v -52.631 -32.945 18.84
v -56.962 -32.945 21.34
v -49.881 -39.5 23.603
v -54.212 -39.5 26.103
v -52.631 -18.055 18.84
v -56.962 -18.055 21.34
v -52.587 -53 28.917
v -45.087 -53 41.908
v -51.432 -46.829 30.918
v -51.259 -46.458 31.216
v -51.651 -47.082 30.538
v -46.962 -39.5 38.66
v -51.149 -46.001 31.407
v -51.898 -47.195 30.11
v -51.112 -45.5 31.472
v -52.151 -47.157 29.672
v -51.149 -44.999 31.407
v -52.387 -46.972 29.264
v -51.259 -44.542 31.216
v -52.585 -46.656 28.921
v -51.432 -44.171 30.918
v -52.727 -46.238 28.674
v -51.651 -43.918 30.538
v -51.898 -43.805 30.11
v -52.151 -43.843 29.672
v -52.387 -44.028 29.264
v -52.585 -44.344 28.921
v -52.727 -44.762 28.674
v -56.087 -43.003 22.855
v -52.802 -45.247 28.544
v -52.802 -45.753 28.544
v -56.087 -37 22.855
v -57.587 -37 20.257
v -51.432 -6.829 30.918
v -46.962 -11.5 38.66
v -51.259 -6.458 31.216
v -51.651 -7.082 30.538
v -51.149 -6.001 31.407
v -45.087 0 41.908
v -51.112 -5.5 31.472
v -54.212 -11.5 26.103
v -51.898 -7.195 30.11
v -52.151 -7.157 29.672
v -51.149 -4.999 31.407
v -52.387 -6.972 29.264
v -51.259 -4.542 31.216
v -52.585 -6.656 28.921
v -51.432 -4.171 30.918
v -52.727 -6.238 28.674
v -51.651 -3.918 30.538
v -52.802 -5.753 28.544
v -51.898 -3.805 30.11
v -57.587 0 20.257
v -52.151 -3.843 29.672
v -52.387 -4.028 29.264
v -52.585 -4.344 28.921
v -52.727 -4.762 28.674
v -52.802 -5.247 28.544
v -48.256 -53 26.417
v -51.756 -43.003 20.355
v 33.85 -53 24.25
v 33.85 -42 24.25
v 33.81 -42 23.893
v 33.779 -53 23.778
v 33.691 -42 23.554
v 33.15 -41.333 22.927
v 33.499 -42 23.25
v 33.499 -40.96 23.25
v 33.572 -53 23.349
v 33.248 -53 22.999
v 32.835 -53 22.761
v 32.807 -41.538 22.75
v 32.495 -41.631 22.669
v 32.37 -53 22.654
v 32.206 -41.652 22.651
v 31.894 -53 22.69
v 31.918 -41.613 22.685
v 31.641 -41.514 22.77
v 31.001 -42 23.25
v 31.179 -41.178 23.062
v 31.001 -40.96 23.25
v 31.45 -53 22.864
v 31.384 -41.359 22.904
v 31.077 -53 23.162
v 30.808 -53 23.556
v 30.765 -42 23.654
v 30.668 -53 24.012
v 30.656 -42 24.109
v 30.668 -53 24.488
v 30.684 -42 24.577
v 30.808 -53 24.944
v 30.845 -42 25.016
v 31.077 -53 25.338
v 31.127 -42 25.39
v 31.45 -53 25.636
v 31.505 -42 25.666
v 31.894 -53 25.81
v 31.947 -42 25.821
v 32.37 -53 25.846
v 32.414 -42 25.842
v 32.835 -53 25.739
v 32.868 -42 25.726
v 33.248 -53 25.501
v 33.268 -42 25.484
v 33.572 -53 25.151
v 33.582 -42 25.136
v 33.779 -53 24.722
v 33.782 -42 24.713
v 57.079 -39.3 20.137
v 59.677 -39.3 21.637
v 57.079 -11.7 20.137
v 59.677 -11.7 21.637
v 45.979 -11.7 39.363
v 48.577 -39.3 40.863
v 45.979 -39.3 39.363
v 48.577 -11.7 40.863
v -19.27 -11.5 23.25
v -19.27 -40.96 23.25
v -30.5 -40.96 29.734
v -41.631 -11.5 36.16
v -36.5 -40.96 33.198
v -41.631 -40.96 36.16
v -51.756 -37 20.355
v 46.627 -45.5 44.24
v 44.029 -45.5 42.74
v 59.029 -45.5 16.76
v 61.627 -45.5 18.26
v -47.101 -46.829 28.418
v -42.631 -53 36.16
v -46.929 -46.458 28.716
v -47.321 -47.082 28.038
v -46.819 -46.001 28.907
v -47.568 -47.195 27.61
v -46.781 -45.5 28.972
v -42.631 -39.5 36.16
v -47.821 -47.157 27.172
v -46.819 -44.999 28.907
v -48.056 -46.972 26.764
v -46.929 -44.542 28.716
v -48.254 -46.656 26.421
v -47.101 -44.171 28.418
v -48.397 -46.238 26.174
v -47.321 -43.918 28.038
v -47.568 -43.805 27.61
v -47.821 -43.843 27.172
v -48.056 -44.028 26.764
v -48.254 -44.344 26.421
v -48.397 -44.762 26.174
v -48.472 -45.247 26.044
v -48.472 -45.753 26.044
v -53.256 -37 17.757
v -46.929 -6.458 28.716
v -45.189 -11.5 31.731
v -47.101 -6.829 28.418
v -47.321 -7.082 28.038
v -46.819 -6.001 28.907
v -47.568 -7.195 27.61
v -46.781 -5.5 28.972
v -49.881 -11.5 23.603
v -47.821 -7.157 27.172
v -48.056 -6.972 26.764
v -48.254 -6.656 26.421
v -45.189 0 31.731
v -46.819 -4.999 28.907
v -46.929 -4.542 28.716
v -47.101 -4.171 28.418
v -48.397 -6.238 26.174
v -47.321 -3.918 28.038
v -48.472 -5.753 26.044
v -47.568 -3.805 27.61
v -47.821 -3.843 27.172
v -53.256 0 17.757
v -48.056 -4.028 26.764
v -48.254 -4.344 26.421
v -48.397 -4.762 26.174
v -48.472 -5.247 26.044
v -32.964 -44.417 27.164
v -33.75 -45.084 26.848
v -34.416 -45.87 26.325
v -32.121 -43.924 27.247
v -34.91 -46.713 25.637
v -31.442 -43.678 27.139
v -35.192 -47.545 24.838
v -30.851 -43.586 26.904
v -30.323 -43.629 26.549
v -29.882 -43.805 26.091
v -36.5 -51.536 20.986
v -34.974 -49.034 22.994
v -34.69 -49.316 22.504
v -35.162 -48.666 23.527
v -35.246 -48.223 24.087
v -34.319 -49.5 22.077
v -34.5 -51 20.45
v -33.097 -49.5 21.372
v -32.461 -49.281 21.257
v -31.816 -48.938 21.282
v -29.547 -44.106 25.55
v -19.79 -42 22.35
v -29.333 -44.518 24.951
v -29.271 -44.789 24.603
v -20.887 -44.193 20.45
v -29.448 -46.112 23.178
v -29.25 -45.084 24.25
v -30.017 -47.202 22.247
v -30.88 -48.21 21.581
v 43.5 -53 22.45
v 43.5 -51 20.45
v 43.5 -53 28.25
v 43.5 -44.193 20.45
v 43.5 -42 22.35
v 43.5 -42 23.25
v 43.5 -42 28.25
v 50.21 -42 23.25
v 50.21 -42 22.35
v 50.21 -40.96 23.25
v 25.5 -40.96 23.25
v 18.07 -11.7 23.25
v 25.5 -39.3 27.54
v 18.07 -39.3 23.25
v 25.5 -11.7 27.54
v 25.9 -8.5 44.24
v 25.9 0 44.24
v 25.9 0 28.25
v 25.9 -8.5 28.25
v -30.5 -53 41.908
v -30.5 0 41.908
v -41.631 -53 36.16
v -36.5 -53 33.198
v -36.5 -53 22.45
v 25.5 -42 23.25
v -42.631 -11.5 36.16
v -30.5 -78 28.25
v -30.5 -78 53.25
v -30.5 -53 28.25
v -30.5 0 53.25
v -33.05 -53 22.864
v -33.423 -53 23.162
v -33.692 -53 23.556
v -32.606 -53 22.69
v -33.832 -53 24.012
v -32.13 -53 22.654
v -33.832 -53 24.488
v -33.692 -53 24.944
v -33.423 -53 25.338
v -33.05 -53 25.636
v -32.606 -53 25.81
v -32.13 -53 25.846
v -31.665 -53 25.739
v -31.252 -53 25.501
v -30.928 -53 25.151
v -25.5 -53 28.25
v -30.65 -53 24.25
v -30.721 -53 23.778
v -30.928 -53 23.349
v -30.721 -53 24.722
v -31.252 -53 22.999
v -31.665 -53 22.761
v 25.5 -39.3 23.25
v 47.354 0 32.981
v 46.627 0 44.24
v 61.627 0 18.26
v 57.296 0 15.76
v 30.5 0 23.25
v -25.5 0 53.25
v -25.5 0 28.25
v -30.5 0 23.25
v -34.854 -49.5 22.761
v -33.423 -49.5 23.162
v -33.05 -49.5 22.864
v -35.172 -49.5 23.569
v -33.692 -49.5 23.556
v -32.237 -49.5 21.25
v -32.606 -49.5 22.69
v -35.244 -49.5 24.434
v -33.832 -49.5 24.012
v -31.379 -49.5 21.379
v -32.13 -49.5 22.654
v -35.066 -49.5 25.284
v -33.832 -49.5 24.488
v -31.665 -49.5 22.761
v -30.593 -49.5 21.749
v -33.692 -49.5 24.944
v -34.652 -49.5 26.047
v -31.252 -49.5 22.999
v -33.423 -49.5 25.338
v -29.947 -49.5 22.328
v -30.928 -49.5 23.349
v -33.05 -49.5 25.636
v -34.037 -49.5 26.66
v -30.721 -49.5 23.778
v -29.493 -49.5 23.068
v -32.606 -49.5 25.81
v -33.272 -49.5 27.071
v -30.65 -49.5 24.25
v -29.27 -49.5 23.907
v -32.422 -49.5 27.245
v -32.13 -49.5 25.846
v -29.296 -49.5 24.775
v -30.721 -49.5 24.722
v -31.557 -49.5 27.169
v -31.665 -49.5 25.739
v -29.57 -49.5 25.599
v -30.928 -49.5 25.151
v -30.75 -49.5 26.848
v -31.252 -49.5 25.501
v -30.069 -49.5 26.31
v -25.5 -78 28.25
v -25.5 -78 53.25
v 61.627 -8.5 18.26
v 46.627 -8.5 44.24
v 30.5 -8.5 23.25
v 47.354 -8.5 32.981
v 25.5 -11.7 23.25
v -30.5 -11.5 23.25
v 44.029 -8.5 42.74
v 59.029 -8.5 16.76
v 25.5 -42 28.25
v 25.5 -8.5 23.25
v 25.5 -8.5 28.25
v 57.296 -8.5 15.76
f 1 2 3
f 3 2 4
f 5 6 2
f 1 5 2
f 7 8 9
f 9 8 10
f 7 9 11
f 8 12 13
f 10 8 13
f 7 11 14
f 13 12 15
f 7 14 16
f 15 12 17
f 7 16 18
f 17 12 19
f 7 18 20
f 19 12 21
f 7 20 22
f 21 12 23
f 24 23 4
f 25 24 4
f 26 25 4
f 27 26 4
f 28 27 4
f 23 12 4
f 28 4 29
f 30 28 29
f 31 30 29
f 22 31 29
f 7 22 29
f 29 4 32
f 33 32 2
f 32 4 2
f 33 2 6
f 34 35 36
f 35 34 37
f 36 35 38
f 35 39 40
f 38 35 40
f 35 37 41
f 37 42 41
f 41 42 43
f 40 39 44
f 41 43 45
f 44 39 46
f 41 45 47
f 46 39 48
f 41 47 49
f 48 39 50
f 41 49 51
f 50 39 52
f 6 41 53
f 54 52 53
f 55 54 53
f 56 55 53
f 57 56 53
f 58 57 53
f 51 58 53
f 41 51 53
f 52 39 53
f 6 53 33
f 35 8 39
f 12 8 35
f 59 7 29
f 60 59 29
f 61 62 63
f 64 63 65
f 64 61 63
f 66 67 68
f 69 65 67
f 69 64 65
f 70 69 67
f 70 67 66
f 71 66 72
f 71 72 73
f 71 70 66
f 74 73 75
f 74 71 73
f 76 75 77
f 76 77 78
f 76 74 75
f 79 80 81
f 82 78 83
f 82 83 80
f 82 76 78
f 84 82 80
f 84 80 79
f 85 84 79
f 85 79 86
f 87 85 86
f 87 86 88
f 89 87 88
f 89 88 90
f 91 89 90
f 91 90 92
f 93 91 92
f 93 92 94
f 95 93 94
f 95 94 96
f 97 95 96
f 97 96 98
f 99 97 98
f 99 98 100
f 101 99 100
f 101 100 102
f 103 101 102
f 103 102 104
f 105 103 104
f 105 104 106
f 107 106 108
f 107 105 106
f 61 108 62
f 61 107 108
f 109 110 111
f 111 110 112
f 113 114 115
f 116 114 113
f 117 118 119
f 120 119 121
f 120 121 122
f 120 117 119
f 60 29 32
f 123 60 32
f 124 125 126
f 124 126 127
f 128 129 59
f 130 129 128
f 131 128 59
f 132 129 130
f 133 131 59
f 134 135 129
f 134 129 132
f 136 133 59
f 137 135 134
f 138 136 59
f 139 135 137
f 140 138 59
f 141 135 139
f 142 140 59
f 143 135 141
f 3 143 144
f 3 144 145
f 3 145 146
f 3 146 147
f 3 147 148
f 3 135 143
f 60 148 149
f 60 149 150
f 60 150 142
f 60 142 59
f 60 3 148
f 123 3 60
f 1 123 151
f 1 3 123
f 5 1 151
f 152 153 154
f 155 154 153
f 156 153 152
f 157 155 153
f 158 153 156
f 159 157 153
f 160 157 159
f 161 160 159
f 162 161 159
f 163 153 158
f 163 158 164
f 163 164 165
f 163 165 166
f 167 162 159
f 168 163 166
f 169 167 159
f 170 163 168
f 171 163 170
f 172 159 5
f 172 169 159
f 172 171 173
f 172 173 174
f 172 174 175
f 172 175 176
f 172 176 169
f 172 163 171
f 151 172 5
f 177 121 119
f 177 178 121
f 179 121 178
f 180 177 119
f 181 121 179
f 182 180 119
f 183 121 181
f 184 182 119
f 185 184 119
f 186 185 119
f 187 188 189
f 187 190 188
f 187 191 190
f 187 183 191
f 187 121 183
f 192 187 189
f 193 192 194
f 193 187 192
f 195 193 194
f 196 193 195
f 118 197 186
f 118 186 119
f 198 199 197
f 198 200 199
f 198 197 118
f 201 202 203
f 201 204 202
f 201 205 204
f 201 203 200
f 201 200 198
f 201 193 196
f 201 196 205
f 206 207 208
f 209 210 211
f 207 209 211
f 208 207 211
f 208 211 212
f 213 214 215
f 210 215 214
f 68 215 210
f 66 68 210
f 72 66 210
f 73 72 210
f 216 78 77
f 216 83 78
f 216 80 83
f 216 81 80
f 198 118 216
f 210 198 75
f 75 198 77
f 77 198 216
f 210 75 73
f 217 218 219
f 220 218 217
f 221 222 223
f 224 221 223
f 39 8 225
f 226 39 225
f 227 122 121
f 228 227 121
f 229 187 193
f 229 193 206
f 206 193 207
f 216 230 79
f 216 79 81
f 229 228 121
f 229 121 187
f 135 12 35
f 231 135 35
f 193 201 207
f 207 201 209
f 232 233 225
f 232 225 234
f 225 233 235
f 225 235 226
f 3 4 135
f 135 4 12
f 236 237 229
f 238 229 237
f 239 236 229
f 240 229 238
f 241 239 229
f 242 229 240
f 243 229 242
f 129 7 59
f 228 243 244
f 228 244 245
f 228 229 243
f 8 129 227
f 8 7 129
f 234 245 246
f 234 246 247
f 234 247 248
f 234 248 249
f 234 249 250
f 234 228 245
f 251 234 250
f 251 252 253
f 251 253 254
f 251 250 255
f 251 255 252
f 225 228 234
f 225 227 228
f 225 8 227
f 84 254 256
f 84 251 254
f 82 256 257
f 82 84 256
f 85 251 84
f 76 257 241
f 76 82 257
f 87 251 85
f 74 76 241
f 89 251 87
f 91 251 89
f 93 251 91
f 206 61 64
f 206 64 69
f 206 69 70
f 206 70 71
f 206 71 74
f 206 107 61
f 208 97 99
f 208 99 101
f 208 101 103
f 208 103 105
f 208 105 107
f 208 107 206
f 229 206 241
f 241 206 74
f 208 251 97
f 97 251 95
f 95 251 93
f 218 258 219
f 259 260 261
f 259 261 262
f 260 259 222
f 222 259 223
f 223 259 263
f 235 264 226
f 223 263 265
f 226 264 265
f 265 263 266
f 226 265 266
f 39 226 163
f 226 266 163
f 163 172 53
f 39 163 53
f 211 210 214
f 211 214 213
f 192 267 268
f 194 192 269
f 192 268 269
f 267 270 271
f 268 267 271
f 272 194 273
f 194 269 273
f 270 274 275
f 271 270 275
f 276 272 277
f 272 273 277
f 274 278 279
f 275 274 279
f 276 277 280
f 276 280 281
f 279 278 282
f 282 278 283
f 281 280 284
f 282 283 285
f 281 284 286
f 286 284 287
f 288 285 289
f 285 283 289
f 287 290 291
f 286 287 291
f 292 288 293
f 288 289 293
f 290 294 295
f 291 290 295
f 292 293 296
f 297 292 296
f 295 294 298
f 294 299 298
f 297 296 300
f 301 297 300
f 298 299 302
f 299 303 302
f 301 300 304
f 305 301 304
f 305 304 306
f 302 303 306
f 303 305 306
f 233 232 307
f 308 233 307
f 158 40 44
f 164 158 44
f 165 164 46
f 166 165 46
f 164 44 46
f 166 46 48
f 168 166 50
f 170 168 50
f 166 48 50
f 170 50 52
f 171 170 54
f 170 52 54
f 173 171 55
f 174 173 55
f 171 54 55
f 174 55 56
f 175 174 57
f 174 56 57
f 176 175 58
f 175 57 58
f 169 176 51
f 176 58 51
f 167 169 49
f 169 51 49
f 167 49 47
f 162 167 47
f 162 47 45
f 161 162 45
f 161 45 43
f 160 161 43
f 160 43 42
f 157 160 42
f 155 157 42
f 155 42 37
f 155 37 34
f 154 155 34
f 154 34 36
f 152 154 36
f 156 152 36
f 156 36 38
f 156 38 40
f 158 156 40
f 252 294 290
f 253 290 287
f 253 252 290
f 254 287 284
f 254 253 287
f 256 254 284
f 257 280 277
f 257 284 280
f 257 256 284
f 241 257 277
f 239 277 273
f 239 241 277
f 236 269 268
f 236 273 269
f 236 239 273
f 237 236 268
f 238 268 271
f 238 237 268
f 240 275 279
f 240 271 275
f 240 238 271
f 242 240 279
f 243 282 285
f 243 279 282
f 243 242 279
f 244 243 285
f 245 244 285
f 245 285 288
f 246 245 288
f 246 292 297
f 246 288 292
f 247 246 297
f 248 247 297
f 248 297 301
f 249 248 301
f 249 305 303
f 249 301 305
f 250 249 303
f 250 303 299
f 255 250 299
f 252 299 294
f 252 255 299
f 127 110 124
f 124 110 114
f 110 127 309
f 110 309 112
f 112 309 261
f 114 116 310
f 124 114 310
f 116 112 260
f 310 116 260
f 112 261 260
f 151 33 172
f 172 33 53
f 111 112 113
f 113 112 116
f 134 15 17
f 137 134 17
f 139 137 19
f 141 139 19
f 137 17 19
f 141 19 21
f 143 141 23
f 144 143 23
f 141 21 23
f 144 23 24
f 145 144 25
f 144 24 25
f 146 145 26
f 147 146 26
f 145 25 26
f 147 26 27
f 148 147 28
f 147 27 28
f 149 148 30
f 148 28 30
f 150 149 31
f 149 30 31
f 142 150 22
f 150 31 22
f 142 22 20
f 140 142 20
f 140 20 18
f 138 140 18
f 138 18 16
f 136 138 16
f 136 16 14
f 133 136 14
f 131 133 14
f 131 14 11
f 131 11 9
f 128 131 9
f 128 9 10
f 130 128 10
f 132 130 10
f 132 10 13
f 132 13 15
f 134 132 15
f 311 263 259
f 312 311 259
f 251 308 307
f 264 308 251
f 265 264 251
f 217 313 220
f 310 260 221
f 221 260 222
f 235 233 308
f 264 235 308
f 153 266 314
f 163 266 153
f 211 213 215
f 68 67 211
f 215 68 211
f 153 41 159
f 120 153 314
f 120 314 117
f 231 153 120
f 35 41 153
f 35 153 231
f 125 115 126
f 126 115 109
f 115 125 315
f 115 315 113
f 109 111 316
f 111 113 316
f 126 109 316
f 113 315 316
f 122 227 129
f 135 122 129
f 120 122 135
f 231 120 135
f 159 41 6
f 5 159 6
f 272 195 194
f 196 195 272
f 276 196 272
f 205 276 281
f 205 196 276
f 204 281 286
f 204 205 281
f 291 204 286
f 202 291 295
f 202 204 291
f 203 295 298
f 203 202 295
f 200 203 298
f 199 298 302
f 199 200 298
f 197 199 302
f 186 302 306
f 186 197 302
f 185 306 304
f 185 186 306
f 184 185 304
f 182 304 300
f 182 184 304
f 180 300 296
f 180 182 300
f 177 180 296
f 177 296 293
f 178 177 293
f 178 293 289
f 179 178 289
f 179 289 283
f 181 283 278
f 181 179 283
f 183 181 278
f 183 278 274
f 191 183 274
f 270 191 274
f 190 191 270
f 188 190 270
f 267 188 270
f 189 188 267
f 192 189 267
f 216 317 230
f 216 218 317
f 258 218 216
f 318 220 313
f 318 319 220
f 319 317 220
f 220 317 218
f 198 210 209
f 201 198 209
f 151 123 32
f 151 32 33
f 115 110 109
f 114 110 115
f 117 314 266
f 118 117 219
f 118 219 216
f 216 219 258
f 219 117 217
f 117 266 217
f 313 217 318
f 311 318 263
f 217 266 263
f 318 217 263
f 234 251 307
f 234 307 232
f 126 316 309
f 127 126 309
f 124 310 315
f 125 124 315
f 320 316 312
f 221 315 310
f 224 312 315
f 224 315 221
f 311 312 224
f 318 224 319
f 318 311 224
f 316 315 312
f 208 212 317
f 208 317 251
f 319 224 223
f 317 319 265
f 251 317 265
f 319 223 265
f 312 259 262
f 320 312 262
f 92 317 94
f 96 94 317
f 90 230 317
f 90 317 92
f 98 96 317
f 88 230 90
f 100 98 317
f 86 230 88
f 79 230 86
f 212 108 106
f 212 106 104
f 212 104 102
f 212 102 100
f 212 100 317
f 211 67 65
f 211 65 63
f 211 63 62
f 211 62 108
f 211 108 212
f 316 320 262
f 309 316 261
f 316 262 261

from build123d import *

# Parameters (mm, degrees)
SKETCH1_W                    = 56
SKETCH1_H                    = 5
BOSS_EXTRUDE1_DEPTH          = 42
SKETCH2_W                    = 5
SKETCH2_H                    = 25
BOSS_EXTRUDE2_DEPTH          = 78
BOSS_EXTRUDE3_DEPTH          = 5
SKETCH5_W                    = 30
SKETCH5_H                    = 37
BOSS_EXTRUDE4_DEPTH          = 3
SKETCH9_W                    = 80
SKETCH9_H                    = 10
BOSS_EXTRUDE7_DEPTH          = 7.8
SKETCH6_R                    = 1.7
CUT_EXTRUDE1_DEPTH           = 10
SKETCH6_3_R                  = 1.7
CUT_EXTRUDE2_DEPTH           = 7.8
BOSS_EXTRUDE5_REACH          = 114.771
CUT_EXTRUDE3_START           = 3
CUT_EXTRUDE3_DEPTH           = 30
BOSS_EXTRUDE8_REACH          = 104.503
SKETCH12_W                   = 6
SKETCH12_H                   = 10
SKETCH14_W                   = 21.376587736
SKETCH14_H                   = 30
BOSS_EXTRUDE9_DEPTH          = 10
CUT_EXTRUDE4_DEPTH           = 113.771445038
SKETCH17_W                   = 20
SKETCH17_H                   = 15
CUT_EXTRUDE5_DEPTH           = 94.029704558
CUT_EXTRUDE6_DEPTH           = 126.411384609
BOSS_EXTRUDE11_DEPTH         = 70
CUT_EXTRUDE7_DEPTH           = 94.029704558
CUT_EXTRUDE8_DEPTH           = 97.630216889
BOSS_EXTRUDE12_DEPTH         = 1
M3_START                     = -53
M3_CLEARANCE_HOLE1_OUTLINE_R = 1.6
M3_CLEARANCE_HOLE1_DEPTH     = 12.039780493
BOSS_EXTRUDE13_REACH         = 111.463
SKETCH25_W                   = 15
SKETCH25_H                   = 40.960219507
BOSS_EXTRUDE14_DEPTH         = 12.039780493
SKETCH27_W                   = 18
SKETCH27_H                   = 11.5
BOSS_EXTRUDE15_DEPTH         = 5.614909
SKETCH28_R                   = 3
CUT_EXTRUDE9_DEPTH           = 38
CHAMFER4_SIZE                = 2
BOSS_EXTRUDE16_DEPTH         = 8.5
CUT_EXTRUDE10_DEPTH          = 108.068430529
BOSS_EXTRUDE17_DEPTH         = 37
CUT_EXTRUDE11_DEPTH          = 40
CUT_EXTRUDE11_DEPTH_BACK     = 137.170264842
SKETCH31_W                   = 22.2
SKETCH31_H                   = 27.6


# Read off the part's stored shape, not the designer's step: M3 Clearance Hole1
with BuildPart() as part:
    # Sketch1 → Boss-Extrude1 (new body)
    with BuildSketch(Plane(origin=(0, 0, 0), x_dir=(1, 0, 0), z_dir=(0, 1, 0))):
        with Locations((-2.5, -25.75)):
            Rectangle(SKETCH1_W, SKETCH1_H)
    extrude(amount=-BOSS_EXTRUDE1_DEPTH)

    # Sketch2 → Boss-Extrude2 (add)
    with BuildSketch(Plane(origin=(0, 0, 0), x_dir=(1, 0, 0), z_dir=(0, 1, 0))):
        with Locations((-28, -40.75)):
            Rectangle(SKETCH2_W, SKETCH2_H)
    extrude(amount=-BOSS_EXTRUDE2_DEPTH)

    # Sketch9 → Boss-Extrude7 (add)
    with BuildSketch(Plane(origin=(0, 0, 28.25), x_dir=(-1, 0, 0), z_dir=(0, 0, -1))):
        with Locations((-3.5, -47)):
            Rectangle(SKETCH9_W, SKETCH9_H)
    extrude(amount=BOSS_EXTRUDE7_DEPTH)


with BuildPart() as body_2:
    # Sketch4 → Boss-Extrude3 (new body)
    with BuildSketch(Plane(origin=(-51.961524227, 0, 30), x_dir=(-0.500000000000001, 0, -0.8660254037844382), z_dir=(0.866025403784438, 0, -0.5000000000000009))):
        Polygon((1.25, -53), (8.25, -43.002963953), (8.25, -37), (11.25, -37), (11.25, 0), (-13.75, 0), (-13.75, -53), align=None)
    extrude(amount=BOSS_EXTRUDE3_DEPTH)

    # Sketch6 → Cut-Extrude1 (cut)
    with BuildSketch(Plane(origin=(-51.961524227, 0, 30), x_dir=(0.5000000000000009, 0, 0.8660254037844383), z_dir=(-0.8660254037844382, 0, 0.5000000000000008))):
        Polygon((10, -11.5), (-4.5, -11.5), (-10, -18.054644759), (-10, -32.945355241), (-4.5, -39.5), (10, -39.5), align=None)
        with Locations((0, -5.5)):
            Circle(SKETCH6_R)
    extrude(amount=-CUT_EXTRUDE1_DEPTH, mode=Mode.SUBTRACT)

    # Sketch6<3> → Cut-Extrude2 (cut)
    with BuildSketch(Plane(origin=(-51.961524227, 0, 30), x_dir=(0.5000000000000009, 0, 0.8660254037844383), z_dir=(-0.8660254037844382, 0, 0.5000000000000008))):
        with Locations((0, -45.5)):
            Circle(SKETCH6_3_R)
    extrude(amount=-CUT_EXTRUDE2_DEPTH, mode=Mode.SUBTRACT)

    # Boss-Extrude5: up to this face of the body (flat: up to its plane)
    boss_extrude5_end = Plane(body_2.part.faces().sort_by_distance((-46.671460718, -53, 34.162658774))[0])
    # Sketch7 → Boss-Extrude5 (add, up to the picked face)
    with BuildSketch(Plane(origin=(0, 0, 0), x_dir=(1, 0, 0), z_dir=(0, 1, 0)), mode=Mode.PRIVATE) as boss_extrude5_sk1:
        Polygon((-45.086524227, -41.907849302), (-30.5, -41.907849302), (-30.5, -36.160254038), (-42.631397208, -36.160254038), (-40.756397208, -39.407849302), align=None)
    boss_extrude5_tool1 = split(extrude(boss_extrude5_sk1.sketch, amount=-BOSS_EXTRUDE5_REACH, mode=Mode.PRIVATE), bisect_by=boss_extrude5_end, keep=Keep.BOTH, mode=Mode.PRIVATE)

    add(part.part)  # Boss-Extrude5 merges part
    add(boss_extrude5_tool1.solids().sort_by(Axis((-36.415744, 0, 39.11699), (0, -1, 0)))[0])

    # Sketch11 → Cut-Extrude3 (cut)
    with BuildSketch(Plane(origin=(-47.631397208, 0, 27.5), x_dir=(-0.5000000000000007, 0, -0.8660254037844384), z_dir=(0.8660254037844383, 0, -0.5000000000000006)).offset(CUT_EXTRUDE3_START)):
        Polygon((4.5, -42), (4.5, -39.5), (10, -32.945355241), (10, -18.054644759), (4.5, -11.5), (-10.5, -11.5), (-10.5, -42), align=None)
    extrude(amount=CUT_EXTRUDE3_DEPTH, mode=Mode.SUBTRACT)

    # Sketch12 → Boss-Extrude8 (add, up to next)
    with BuildSketch(Plane.XY.offset(28.25), mode=Mode.PRIVATE) as boss_extrude8_sk1:
        with Locations((-33.5, -47)):
            Rectangle(SKETCH12_W, SKETCH12_H)
    boss_extrude8_tool1 = extrude(boss_extrude8_sk1.sketch, amount=BOSS_EXTRUDE8_REACH, mode=Mode.PRIVATE) - body_2.part
    add(boss_extrude8_tool1.solids().sort_by_distance((-33.5, -47, 28.25))[0])

    # Sketch14 → Boss-Extrude9 (add)
    with BuildSketch(Plane(origin=(12.865054877, -25.730109754, 22.282928689), x_dir=(0.8660254037844385, 0, -0.5000000000000004), z_dir=(0.3535533905932723, -0.7071067811865512, 0.6123724356957913))):
        with Locations((-39.001760389, -22.151235068)):
            Rectangle(SKETCH14_W, SKETCH14_H)
    extrude(amount=BOSS_EXTRUDE9_DEPTH)

    # Sketch15 → Cut-Extrude4 (cut, through all)
    with BuildSketch(Plane(origin=(0, 0, 0), x_dir=(1, 0, 0), z_dir=(0, 1, 0))):
        Polygon((-36.5, -36.160254038), (-36.5, -20.45), (-43.302739548, -24.377563509), align=None)
        Polygon((-36.5, -20.45), (-20.88676203, -20.45), (-24.790071522, -13.689269641), align=None)
        Polygon((-16.38342993, -28.25), (-25.5, -28.25), (-25.5, -46.759010276), (-10.647935899, -38.184167069), align=None)
        Polygon((-30.5, -41.907849302), (-33.181624327, -41.907849302), (-30.5, -46.552558883), align=None)
    extrude(amount=-CUT_EXTRUDE4_DEPTH, mode=Mode.SUBTRACT)

    # Sketch17 → Cut-Extrude5 (cut, through all)
    with BuildSketch(Plane(origin=(12.865054877, -25.730109754, 22.282928689), x_dir=(0.8660254037844385, 0, -0.5000000000000004), z_dir=(0.3535533905932723, -0.7071067811865512, 0.6123724356957913))):
        with Locations((-38.313466521, -30.509099445)):
            Rectangle(SKETCH17_W, SKETCH17_H)
    extrude(amount=-CUT_EXTRUDE5_DEPTH, mode=Mode.SUBTRACT)

    # Sketch18 → Cut-Extrude6 (cut, through all)
    with BuildSketch(Plane.ZY.offset(20.88676203)):
        Polygon((20.45, -42), (22.349523679, -42), (20.45, -44.193381015), align=None)
    extrude(amount=-CUT_EXTRUDE6_DEPTH, mode=Mode.SUBTRACT)

    # Sketch20 → Boss-Extrude11 (add)
    with BuildSketch(Plane.ZY.offset(19.790071522)):
        Polygon((23.25, -40.960219507), (22.349523679, -42), (23.25, -42), align=None)
    extrude(amount=-BOSS_EXTRUDE11_DEPTH)

    # Sketch21 → Cut-Extrude7 (cut, through all)
    with BuildSketch(Plane(origin=(12.865054877, -25.730109754, 22.282928689), x_dir=(0.935414346693486, 0.2672612419124244, -0.23145502494313555), z_dir=(-0.35355339059327223, 0.7071067811865507, -0.6123724356957918))):
        Polygon((-34.354012493, 9.239410059), (-34.909798545, 10.600802291), (-37.243131878, 10.600802291), (-36.354012493, 8.422913478), align=None)
    extrude(amount=CUT_EXTRUDE7_DEPTH, mode=Mode.SUBTRACT)

    # Sketch22 → Cut-Extrude8 (cut, through all)
    with BuildSketch(Plane.XZ.offset(52)):
        Polygon((-30.5, 28.25), (-30.5, 36.160254038), (-36.565698604, 36.160254038), (-36.5, 20.45), (-16.5, 20.45), (-16.5, 28.25), align=None)
    extrude(amount=CUT_EXTRUDE8_DEPTH, mode=Mode.SUBTRACT)

    # Sketch24 → Boss-Extrude12 (add)
    with BuildSketch(Plane.XZ.offset(52)):
        Polygon((-30.5, 36.160254038), (-36.5, 36.160254038), (-36.5, 20.45), (43.5, 20.45), (43.5, 28.25), (-25.5, 28.25), (-30.5, 28.25), align=None)
    extrude(amount=BOSS_EXTRUDE12_DEPTH)

    # M3 Clearance Hole1 outline → M3 Clearance Hole1 (cut)
    with BuildSketch(Plane(origin=(0, 0, 0), x_dir=(1, 0, 0), z_dir=(0, 1, 0)).offset(M3_START)):
        with Locations((-32.25, -24.25)):
            Circle(M3_CLEARANCE_HOLE1_OUTLINE_R)
        with Locations((32.25, -24.25)):
            Circle(M3_CLEARANCE_HOLE1_OUTLINE_R)
    extrude(amount=M3_CLEARANCE_HOLE1_DEPTH, mode=Mode.SUBTRACT)

    # Boss-Extrude13: up to this face of the body (flat: up to its plane)
    boss_extrude13_end = Plane(body_2.part.faces().sort_by_distance((-37.124420642, -23.2412407, 36.160254038))[0])
    # Sketch25 → Boss-Extrude13 (add, up to the picked face)
    with BuildSketch(Plane(origin=(5.25, 0, 9.09326674), x_dir=(-0.8660254037844383, 0, 0.5000000000000008), z_dir=(-0.5000000000000007, 0, -0.8660254037844382)), mode=Mode.PRIVATE) as boss_extrude13_sk1:
        with Locations((48.780544247, -20.480109754)):
            Rectangle(SKETCH25_W, SKETCH25_H)
    boss_extrude13_tool1 = split(extrude(boss_extrude13_sk1.sketch, amount=-BOSS_EXTRUDE13_REACH, mode=Mode.PRIVATE), bisect_by=boss_extrude13_end, keep=Keep.BOTH, mode=Mode.PRIVATE)
    add(boss_extrude13_tool1.solids().sort_by(Axis((-36.995191, -20.48011, 33.483539), (0.5000000000000007, 0, 0.8660254037844382)))[0])

    # Sketch26 → Boss-Extrude14 (add)
    with BuildSketch(Plane.XZ.offset(40.960219507)):
        Polygon((-36.5, 33.197640478), (-36.5, 36.160254038), (-41.631397208, 36.160254038), align=None)
    extrude(amount=BOSS_EXTRUDE14_DEPTH)

    # Sketch27 → Boss-Extrude15 (add)
    with BuildSketch(Plane(origin=(5.25, 0, 9.09326674), x_dir=(-0.8660254037844383, 0, 0.5000000000000008), z_dir=(-0.5000000000000007, 0, -0.8660254037844382))):
        with Locations((47.038774815, -5.75)):
            Rectangle(SKETCH27_W, SKETCH27_H)
    extrude(amount=BOSS_EXTRUDE15_DEPTH)

    # Sketch28 → Cut-Extrude9 (cut)
    with BuildSketch(Plane.XZ.offset(11.5)):
        with Locations((-32.25, 24.25)):
            Circle(SKETCH28_R)
    extrude(amount=CUT_EXTRUDE9_DEPTH, mode=Mode.SUBTRACT)

    # Chamfer4
    chamfer4_edges = [body_2.edges().sort_by_distance(p)[0] for p in [
        (3.5, -53, 20.45),
    ]]
    chamfer(chamfer4_edges, length=CHAMFER4_SIZE)

    # Sketch29 → Boss-Extrude16 (add)
    with BuildSketch(Plane(origin=(0, 0, 0), x_dir=(1, 0, 0), z_dir=(0, 1, 0))):
        Polygon((25.5, -23.25), (30.5, -23.25), (47.353915399, -32.980612592), (57.296460718, -15.759618943), (61.626587737, -18.259618943), (46.626587737, -44.240381057), (25.9, -44.240381057), (25.9, -28.25), (25.5, -28.25), align=None)
    extrude(amount=-BOSS_EXTRUDE16_DEPTH)

    # Sketch30<2> → Boss-Extrude17 (add)
    with BuildSketch(Plane.XZ.offset(8.5)):
        Polygon((46.626587737, 44.240381057), (44.028511525, 42.740381057), (59.028511525, 16.759618943), (61.626587737, 18.259618943), align=None)
    extrude(amount=BOSS_EXTRUDE17_DEPTH)

    # Sketch31 → Cut-Extrude11 (cut, two sides: drawn at the far end of the back side and taken through both)
    with BuildSketch(Plane(origin=(51.528511525, 0, 29.75), x_dir=(-0.5000000000000012, 0, 0.866025403784438), z_dir=(-0.8660254037844379, 0, -0.5000000000000011)).offset(-CUT_EXTRUDE11_DEPTH_BACK)):
        with Locations((0, -25.5)):
            Rectangle(SKETCH31_W, SKETCH31_H)
    extrude(amount=CUT_EXTRUDE11_DEPTH + CUT_EXTRUDE11_DEPTH_BACK, mode=Mode.SUBTRACT)


with BuildPart() as body_3:
    # Sketch5 → Boss-Extrude4 (new body)
    with BuildSketch(Plane(origin=(54.126587737, 0, 31.25), x_dir=(0.5000000000000011, 0, -0.866025403784438), z_dir=(0.866025403784438, 0, 0.5000000000000011))):
        with Locations((0, -27)):
            Rectangle(SKETCH5_W, SKETCH5_H)
    extrude(amount=-BOSS_EXTRUDE4_DEPTH)

    # Sketch30 → Cut-Extrude10 (cut, through all)
    with BuildSketch(Plane.XZ.offset(8.5)):
        Polygon((46.626587737, 44.240381057), (44.028511525, 42.740381057), (59.028511525, 16.759618943), (61.626587737, 18.259618943), align=None)
    extrude(amount=CUT_EXTRUDE10_DEPTH, mode=Mode.SUBTRACT)


solid = body_2.part
